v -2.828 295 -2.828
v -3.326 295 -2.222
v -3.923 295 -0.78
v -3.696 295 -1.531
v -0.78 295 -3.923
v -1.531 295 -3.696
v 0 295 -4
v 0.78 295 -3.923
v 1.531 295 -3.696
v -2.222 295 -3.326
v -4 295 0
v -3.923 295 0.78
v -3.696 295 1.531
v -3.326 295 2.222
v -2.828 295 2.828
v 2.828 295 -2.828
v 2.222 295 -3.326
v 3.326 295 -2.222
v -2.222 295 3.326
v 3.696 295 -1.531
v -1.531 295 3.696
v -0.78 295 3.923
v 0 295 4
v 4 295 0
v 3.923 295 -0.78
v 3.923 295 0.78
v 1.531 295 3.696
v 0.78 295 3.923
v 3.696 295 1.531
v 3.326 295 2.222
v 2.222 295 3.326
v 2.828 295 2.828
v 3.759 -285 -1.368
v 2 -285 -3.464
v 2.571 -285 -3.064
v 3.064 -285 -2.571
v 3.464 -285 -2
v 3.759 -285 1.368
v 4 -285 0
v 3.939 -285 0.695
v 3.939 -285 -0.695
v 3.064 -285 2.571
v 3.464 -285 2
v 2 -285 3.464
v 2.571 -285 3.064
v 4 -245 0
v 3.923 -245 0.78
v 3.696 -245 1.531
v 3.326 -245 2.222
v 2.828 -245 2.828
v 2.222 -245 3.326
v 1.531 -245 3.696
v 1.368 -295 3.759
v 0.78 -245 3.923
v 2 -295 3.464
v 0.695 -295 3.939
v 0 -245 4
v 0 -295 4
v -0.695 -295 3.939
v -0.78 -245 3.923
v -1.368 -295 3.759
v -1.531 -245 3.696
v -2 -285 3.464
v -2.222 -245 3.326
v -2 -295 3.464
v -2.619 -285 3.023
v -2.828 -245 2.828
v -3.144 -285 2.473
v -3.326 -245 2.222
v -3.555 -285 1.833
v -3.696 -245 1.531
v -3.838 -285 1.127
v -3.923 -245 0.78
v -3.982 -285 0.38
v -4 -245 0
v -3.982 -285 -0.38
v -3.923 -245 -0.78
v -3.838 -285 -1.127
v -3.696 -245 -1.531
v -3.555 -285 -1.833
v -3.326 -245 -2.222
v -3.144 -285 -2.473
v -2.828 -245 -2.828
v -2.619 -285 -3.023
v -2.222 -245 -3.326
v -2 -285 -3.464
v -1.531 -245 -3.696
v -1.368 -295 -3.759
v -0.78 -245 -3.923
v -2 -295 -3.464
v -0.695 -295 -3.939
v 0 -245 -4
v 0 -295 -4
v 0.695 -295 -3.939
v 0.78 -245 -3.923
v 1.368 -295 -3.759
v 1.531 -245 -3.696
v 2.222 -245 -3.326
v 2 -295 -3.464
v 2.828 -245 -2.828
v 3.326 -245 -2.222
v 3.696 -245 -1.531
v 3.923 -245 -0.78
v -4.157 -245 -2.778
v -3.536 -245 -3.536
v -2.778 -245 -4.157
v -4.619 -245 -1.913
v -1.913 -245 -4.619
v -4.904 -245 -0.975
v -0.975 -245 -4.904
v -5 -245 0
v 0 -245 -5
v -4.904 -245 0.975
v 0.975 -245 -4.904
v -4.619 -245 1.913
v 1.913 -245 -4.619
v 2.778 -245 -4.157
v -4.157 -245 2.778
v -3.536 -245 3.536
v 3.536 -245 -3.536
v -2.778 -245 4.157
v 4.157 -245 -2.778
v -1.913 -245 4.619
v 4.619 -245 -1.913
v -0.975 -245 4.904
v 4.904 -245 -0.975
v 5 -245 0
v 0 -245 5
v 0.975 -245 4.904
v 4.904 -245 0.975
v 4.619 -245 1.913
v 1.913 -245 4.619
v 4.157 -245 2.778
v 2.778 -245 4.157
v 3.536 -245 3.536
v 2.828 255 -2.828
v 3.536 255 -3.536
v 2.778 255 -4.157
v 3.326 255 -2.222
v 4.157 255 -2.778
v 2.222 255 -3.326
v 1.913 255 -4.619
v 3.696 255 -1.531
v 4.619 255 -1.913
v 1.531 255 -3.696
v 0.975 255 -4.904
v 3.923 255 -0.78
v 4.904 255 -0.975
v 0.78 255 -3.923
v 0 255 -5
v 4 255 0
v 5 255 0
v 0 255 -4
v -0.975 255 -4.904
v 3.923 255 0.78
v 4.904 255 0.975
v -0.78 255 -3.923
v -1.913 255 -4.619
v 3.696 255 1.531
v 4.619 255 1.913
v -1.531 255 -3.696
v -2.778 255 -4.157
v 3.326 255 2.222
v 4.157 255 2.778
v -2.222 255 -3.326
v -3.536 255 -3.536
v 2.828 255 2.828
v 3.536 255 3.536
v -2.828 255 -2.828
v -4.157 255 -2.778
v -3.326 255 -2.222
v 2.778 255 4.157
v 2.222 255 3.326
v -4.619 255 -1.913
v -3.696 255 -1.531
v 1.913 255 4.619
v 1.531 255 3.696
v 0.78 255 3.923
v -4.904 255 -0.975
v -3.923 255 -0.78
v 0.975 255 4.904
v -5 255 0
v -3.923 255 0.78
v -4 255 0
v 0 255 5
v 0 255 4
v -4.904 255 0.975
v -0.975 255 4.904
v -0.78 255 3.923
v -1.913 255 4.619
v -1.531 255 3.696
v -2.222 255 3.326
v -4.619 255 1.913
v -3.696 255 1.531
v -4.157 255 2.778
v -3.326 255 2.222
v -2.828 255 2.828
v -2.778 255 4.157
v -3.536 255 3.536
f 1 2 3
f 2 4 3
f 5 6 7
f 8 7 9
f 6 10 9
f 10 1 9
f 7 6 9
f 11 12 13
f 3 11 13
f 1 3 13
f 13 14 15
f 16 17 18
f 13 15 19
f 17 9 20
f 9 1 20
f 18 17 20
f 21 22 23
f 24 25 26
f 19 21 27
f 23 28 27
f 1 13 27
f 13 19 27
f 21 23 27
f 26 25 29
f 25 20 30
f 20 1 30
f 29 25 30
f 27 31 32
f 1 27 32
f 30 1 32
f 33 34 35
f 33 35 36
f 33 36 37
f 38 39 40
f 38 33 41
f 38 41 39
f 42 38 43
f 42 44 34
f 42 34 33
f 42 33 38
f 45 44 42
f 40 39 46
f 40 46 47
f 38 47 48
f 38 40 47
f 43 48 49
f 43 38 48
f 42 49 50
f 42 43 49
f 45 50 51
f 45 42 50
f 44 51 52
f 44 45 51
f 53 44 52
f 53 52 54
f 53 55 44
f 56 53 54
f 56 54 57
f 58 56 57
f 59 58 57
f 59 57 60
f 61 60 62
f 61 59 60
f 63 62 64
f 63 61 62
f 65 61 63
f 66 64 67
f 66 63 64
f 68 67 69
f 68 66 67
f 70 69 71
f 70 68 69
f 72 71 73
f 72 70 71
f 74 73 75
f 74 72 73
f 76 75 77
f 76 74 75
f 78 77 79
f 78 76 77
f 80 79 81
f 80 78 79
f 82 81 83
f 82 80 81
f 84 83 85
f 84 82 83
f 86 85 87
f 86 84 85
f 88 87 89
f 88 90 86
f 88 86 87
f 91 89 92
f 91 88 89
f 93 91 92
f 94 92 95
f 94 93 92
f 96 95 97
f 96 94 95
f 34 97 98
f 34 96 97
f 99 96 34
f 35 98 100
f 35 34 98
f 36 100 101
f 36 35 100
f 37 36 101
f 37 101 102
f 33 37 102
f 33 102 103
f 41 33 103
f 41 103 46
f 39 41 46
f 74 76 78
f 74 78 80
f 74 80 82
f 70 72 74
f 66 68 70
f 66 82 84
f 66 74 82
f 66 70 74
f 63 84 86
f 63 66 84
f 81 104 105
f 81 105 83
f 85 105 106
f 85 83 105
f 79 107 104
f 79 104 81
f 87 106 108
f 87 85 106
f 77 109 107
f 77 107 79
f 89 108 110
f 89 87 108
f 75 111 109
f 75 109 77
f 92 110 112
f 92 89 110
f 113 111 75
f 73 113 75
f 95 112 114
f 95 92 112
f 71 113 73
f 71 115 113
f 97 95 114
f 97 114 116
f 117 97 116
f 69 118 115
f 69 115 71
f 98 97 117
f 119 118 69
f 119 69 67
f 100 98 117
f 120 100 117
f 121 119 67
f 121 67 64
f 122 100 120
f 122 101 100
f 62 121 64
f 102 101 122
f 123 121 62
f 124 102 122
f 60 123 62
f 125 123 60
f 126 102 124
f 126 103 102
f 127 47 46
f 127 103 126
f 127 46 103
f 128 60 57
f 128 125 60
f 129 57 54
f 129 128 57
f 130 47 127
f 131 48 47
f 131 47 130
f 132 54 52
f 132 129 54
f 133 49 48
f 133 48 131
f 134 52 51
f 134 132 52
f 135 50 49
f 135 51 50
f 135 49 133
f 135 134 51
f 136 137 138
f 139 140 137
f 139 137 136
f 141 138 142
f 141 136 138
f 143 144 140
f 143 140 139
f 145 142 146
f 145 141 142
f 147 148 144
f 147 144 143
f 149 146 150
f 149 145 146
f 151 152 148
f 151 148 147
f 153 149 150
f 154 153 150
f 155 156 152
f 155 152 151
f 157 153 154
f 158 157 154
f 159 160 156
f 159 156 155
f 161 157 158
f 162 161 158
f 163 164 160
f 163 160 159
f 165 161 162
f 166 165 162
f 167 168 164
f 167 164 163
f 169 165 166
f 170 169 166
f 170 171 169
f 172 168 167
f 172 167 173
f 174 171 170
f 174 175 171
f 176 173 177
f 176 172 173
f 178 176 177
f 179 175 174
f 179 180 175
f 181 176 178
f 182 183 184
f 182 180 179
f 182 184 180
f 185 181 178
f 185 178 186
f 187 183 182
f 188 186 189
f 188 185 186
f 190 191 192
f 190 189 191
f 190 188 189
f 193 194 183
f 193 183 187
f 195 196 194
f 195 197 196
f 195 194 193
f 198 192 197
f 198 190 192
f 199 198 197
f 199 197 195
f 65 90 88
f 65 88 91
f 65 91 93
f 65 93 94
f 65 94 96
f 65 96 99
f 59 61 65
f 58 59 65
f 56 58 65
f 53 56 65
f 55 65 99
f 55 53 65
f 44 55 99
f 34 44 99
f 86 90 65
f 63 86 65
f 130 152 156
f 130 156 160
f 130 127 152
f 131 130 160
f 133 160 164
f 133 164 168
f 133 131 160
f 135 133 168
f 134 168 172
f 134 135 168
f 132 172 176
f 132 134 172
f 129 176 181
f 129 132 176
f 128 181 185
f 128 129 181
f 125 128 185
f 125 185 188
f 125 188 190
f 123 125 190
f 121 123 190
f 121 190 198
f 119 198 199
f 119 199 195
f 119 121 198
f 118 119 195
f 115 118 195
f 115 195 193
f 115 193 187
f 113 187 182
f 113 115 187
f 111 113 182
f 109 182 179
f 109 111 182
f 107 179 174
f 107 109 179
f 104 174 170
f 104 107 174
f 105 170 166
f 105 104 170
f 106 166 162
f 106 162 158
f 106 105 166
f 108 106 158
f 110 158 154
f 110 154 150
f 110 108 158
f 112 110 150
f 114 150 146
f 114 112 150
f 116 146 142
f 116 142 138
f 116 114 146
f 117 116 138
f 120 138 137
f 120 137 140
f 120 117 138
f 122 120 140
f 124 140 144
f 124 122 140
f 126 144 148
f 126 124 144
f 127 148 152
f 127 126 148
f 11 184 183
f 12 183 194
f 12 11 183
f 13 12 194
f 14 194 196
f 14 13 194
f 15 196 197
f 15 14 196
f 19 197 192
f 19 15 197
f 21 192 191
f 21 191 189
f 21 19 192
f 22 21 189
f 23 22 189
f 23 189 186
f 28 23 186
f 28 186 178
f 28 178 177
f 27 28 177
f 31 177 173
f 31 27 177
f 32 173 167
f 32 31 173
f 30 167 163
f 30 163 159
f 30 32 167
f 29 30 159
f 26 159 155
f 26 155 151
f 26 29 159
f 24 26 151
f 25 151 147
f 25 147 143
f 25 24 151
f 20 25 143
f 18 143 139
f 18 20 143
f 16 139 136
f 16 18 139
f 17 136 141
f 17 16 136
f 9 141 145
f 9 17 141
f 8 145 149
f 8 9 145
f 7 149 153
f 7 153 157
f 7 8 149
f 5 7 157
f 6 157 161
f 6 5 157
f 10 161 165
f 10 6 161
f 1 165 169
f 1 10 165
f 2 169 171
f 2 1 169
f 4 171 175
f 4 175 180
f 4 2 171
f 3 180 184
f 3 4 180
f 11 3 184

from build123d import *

# Parameters (mm, degrees)
F0_R     = 5
F1_DEPTH = 295
F2_R     = 9
F2_R_2   = 4
F3_DEPTH = 50
F4_R     = 5
F4_R_2   = 4
F5_DEPTH = 40
F7_DEPTH = 10


with BuildPart() as f1:
    # F0 (on Front) → F1 (new body, symmetric)
    with BuildSketch(Plane.XZ):
        Circle(F0_R)
    extrude(amount=F1_DEPTH, both=True)

    # F2 (on face) → F3 (cut)
    with BuildSketch(Plane.XZ.offset(295)):
        Circle(F2_R)
        Circle(F2_R_2, mode=Mode.SUBTRACT)
    extrude(amount=-F3_DEPTH, mode=Mode.SUBTRACT)

    # F4 (on face) → F5 (cut)
    with BuildSketch(Plane(origin=(0, 295, 0), x_dir=(-1, 0, 0), z_dir=(0, 1, 0))):
        Circle(F4_R)
        Circle(F4_R_2, mode=Mode.SUBTRACT)
    extrude(amount=-F5_DEPTH, mode=Mode.SUBTRACT)

    # F6 (on face) → F7 (cut)
    with BuildSketch(Plane.XZ.offset(295)):
        Polygon((2, 9.214783), (2, -9.214783), (-2, -9.214783), (-2, 9.214783), (-11.609545, 9.214783), (-11.609545, -12.255539), (8.235434, -15.570633), (8.235434, 9.214783), align=None)
    extrude(amount=-F7_DEPTH, mode=Mode.SUBTRACT)


solid = f1.part
